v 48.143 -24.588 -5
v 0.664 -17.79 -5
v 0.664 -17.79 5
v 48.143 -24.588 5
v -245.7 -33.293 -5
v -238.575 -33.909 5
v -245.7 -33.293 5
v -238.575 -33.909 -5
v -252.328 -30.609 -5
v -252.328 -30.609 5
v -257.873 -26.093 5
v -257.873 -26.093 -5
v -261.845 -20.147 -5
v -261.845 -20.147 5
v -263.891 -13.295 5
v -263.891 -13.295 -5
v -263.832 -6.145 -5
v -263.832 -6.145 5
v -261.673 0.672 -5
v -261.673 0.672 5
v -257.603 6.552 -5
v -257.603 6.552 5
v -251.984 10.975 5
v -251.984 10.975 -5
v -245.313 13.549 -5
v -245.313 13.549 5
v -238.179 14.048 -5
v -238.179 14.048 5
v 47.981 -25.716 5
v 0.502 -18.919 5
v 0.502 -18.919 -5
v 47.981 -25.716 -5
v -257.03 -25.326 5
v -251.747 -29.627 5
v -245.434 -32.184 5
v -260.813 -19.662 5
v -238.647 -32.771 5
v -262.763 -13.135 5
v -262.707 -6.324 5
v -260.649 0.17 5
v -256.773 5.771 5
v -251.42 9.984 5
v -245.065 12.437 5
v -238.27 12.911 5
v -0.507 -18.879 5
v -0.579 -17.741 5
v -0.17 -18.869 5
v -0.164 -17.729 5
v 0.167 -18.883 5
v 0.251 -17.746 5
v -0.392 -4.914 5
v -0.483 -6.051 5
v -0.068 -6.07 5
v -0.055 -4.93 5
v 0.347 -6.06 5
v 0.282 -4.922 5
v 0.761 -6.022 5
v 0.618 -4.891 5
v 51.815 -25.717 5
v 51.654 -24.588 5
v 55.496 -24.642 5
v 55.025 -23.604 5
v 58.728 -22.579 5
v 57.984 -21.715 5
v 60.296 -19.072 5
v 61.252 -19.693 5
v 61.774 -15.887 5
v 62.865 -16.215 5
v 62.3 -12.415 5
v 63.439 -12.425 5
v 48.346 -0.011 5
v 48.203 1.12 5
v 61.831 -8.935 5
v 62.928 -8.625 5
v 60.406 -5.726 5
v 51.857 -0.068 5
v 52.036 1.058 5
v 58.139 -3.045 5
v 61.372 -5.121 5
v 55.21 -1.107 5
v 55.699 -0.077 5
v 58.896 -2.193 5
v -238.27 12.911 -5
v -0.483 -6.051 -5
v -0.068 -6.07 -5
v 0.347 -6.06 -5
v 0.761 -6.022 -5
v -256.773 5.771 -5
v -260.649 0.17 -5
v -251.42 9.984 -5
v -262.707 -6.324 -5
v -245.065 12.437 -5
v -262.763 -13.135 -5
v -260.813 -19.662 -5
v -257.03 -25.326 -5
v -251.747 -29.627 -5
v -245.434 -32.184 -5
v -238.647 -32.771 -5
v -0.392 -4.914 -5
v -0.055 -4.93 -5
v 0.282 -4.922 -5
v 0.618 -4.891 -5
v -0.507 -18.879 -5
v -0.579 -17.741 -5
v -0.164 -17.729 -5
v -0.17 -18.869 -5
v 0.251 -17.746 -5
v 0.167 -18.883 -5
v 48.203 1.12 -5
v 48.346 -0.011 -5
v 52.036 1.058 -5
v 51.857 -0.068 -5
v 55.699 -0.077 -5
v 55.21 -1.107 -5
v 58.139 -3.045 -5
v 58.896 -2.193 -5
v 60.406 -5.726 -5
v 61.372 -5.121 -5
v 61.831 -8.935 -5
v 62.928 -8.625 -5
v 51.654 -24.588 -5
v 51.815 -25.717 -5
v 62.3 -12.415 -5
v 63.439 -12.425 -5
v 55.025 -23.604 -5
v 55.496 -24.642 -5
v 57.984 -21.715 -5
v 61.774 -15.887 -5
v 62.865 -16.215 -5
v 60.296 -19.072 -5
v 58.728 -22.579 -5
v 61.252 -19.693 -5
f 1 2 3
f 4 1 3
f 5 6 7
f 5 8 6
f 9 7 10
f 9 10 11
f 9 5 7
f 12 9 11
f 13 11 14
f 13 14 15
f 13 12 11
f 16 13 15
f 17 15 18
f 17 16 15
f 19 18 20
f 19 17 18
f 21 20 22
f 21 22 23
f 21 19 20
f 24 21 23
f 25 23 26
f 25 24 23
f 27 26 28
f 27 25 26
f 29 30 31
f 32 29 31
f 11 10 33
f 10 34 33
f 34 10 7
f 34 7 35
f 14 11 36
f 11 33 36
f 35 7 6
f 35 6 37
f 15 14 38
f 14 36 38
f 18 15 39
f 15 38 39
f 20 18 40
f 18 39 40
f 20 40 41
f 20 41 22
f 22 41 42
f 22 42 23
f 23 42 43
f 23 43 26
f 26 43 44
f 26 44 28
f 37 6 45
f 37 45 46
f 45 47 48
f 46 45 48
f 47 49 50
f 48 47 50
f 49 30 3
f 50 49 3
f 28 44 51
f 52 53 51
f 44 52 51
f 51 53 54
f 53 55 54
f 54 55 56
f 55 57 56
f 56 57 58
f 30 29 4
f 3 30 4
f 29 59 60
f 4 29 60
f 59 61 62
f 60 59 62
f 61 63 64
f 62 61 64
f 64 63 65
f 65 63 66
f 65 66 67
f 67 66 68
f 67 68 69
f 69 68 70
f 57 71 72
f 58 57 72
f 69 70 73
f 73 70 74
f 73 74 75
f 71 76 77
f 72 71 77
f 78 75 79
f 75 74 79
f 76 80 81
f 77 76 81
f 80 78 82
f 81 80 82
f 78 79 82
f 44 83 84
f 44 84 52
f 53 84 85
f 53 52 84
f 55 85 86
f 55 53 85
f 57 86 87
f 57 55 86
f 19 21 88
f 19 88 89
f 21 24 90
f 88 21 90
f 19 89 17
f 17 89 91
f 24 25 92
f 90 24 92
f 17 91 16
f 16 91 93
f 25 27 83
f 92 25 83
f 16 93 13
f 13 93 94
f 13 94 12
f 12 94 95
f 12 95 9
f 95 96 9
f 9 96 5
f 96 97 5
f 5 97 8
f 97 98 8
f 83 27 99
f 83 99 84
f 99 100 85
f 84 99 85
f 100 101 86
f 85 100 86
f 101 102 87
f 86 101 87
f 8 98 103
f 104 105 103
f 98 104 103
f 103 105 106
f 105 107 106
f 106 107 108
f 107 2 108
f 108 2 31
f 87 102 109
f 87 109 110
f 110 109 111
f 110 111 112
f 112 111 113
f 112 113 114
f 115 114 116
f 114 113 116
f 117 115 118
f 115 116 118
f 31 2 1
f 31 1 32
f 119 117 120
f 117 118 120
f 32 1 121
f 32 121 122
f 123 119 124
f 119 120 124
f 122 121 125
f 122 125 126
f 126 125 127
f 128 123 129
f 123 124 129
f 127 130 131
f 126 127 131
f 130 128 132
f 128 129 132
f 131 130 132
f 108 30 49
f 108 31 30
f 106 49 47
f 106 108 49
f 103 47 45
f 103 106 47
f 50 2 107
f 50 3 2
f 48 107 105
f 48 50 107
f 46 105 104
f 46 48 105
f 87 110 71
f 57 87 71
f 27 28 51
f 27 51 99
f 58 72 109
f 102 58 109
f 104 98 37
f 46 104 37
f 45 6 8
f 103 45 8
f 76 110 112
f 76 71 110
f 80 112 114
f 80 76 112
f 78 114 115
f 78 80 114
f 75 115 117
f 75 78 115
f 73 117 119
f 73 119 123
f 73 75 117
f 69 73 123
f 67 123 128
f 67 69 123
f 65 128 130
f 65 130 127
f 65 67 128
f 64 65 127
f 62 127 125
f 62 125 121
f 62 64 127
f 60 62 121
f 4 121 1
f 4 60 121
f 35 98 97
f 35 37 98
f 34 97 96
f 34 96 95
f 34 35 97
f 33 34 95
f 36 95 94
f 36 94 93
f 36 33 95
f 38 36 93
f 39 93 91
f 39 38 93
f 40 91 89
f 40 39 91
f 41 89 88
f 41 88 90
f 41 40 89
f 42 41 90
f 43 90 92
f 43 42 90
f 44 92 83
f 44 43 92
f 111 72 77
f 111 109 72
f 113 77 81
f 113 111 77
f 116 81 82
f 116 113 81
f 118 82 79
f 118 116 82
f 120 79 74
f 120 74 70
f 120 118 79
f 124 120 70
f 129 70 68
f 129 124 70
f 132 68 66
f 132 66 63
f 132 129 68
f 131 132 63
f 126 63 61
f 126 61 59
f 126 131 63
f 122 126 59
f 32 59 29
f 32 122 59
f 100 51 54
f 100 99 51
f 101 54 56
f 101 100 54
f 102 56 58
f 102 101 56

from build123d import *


with BuildPart() as part:
    # Sweep1: sweep along a path in Sketch2
    with BuildLine(Plane.XY) as sweep1_path:
        Line((0.760799283, -6.022132882), (48.345774261, -0.010539388))
        ThreePointArc((48.345774261, -0.010539388), (62.299537257, -12.415218786), (48.142681566, -24.587605966))
        Line((48.142681566, -24.587605966), (0.663551745, -17.790449832))
        ThreePointArc((0.663551745, -17.790449832), (0.04348261, -17.733939776), (-0.579113336, -17.741247775))
        Line((-0.579113336, -17.741247775), (-238.647292697, -32.77092096))
        ThreePointArc((-238.647292697, -32.77092096), (-262.989356674, -9.727192609), (-238.269798997, 12.91111482))
        Line((-238.269798997, 12.91111482), (-0.482509205, -6.050792086))
        ThreePointArc((-0.482509205, -6.050792086), (0.139880947, -6.068388033), (0.760799283, -6.022132882))
    # Sketch3 → Sweep1 (sweep)
    with BuildSketch(Plane(origin=(-238.269798997, 12.91111482, 0), x_dir=(0, 0, 1), z_dir=(-0.9968355989946425, 0.07949080812894212, 0))):
        Polygon((0, 0), (5, 0), (5, 1.14), (-5, 1.14), (-5, 0), align=None)
    sweep(path=sweep1_path.line)


solid = part.part
